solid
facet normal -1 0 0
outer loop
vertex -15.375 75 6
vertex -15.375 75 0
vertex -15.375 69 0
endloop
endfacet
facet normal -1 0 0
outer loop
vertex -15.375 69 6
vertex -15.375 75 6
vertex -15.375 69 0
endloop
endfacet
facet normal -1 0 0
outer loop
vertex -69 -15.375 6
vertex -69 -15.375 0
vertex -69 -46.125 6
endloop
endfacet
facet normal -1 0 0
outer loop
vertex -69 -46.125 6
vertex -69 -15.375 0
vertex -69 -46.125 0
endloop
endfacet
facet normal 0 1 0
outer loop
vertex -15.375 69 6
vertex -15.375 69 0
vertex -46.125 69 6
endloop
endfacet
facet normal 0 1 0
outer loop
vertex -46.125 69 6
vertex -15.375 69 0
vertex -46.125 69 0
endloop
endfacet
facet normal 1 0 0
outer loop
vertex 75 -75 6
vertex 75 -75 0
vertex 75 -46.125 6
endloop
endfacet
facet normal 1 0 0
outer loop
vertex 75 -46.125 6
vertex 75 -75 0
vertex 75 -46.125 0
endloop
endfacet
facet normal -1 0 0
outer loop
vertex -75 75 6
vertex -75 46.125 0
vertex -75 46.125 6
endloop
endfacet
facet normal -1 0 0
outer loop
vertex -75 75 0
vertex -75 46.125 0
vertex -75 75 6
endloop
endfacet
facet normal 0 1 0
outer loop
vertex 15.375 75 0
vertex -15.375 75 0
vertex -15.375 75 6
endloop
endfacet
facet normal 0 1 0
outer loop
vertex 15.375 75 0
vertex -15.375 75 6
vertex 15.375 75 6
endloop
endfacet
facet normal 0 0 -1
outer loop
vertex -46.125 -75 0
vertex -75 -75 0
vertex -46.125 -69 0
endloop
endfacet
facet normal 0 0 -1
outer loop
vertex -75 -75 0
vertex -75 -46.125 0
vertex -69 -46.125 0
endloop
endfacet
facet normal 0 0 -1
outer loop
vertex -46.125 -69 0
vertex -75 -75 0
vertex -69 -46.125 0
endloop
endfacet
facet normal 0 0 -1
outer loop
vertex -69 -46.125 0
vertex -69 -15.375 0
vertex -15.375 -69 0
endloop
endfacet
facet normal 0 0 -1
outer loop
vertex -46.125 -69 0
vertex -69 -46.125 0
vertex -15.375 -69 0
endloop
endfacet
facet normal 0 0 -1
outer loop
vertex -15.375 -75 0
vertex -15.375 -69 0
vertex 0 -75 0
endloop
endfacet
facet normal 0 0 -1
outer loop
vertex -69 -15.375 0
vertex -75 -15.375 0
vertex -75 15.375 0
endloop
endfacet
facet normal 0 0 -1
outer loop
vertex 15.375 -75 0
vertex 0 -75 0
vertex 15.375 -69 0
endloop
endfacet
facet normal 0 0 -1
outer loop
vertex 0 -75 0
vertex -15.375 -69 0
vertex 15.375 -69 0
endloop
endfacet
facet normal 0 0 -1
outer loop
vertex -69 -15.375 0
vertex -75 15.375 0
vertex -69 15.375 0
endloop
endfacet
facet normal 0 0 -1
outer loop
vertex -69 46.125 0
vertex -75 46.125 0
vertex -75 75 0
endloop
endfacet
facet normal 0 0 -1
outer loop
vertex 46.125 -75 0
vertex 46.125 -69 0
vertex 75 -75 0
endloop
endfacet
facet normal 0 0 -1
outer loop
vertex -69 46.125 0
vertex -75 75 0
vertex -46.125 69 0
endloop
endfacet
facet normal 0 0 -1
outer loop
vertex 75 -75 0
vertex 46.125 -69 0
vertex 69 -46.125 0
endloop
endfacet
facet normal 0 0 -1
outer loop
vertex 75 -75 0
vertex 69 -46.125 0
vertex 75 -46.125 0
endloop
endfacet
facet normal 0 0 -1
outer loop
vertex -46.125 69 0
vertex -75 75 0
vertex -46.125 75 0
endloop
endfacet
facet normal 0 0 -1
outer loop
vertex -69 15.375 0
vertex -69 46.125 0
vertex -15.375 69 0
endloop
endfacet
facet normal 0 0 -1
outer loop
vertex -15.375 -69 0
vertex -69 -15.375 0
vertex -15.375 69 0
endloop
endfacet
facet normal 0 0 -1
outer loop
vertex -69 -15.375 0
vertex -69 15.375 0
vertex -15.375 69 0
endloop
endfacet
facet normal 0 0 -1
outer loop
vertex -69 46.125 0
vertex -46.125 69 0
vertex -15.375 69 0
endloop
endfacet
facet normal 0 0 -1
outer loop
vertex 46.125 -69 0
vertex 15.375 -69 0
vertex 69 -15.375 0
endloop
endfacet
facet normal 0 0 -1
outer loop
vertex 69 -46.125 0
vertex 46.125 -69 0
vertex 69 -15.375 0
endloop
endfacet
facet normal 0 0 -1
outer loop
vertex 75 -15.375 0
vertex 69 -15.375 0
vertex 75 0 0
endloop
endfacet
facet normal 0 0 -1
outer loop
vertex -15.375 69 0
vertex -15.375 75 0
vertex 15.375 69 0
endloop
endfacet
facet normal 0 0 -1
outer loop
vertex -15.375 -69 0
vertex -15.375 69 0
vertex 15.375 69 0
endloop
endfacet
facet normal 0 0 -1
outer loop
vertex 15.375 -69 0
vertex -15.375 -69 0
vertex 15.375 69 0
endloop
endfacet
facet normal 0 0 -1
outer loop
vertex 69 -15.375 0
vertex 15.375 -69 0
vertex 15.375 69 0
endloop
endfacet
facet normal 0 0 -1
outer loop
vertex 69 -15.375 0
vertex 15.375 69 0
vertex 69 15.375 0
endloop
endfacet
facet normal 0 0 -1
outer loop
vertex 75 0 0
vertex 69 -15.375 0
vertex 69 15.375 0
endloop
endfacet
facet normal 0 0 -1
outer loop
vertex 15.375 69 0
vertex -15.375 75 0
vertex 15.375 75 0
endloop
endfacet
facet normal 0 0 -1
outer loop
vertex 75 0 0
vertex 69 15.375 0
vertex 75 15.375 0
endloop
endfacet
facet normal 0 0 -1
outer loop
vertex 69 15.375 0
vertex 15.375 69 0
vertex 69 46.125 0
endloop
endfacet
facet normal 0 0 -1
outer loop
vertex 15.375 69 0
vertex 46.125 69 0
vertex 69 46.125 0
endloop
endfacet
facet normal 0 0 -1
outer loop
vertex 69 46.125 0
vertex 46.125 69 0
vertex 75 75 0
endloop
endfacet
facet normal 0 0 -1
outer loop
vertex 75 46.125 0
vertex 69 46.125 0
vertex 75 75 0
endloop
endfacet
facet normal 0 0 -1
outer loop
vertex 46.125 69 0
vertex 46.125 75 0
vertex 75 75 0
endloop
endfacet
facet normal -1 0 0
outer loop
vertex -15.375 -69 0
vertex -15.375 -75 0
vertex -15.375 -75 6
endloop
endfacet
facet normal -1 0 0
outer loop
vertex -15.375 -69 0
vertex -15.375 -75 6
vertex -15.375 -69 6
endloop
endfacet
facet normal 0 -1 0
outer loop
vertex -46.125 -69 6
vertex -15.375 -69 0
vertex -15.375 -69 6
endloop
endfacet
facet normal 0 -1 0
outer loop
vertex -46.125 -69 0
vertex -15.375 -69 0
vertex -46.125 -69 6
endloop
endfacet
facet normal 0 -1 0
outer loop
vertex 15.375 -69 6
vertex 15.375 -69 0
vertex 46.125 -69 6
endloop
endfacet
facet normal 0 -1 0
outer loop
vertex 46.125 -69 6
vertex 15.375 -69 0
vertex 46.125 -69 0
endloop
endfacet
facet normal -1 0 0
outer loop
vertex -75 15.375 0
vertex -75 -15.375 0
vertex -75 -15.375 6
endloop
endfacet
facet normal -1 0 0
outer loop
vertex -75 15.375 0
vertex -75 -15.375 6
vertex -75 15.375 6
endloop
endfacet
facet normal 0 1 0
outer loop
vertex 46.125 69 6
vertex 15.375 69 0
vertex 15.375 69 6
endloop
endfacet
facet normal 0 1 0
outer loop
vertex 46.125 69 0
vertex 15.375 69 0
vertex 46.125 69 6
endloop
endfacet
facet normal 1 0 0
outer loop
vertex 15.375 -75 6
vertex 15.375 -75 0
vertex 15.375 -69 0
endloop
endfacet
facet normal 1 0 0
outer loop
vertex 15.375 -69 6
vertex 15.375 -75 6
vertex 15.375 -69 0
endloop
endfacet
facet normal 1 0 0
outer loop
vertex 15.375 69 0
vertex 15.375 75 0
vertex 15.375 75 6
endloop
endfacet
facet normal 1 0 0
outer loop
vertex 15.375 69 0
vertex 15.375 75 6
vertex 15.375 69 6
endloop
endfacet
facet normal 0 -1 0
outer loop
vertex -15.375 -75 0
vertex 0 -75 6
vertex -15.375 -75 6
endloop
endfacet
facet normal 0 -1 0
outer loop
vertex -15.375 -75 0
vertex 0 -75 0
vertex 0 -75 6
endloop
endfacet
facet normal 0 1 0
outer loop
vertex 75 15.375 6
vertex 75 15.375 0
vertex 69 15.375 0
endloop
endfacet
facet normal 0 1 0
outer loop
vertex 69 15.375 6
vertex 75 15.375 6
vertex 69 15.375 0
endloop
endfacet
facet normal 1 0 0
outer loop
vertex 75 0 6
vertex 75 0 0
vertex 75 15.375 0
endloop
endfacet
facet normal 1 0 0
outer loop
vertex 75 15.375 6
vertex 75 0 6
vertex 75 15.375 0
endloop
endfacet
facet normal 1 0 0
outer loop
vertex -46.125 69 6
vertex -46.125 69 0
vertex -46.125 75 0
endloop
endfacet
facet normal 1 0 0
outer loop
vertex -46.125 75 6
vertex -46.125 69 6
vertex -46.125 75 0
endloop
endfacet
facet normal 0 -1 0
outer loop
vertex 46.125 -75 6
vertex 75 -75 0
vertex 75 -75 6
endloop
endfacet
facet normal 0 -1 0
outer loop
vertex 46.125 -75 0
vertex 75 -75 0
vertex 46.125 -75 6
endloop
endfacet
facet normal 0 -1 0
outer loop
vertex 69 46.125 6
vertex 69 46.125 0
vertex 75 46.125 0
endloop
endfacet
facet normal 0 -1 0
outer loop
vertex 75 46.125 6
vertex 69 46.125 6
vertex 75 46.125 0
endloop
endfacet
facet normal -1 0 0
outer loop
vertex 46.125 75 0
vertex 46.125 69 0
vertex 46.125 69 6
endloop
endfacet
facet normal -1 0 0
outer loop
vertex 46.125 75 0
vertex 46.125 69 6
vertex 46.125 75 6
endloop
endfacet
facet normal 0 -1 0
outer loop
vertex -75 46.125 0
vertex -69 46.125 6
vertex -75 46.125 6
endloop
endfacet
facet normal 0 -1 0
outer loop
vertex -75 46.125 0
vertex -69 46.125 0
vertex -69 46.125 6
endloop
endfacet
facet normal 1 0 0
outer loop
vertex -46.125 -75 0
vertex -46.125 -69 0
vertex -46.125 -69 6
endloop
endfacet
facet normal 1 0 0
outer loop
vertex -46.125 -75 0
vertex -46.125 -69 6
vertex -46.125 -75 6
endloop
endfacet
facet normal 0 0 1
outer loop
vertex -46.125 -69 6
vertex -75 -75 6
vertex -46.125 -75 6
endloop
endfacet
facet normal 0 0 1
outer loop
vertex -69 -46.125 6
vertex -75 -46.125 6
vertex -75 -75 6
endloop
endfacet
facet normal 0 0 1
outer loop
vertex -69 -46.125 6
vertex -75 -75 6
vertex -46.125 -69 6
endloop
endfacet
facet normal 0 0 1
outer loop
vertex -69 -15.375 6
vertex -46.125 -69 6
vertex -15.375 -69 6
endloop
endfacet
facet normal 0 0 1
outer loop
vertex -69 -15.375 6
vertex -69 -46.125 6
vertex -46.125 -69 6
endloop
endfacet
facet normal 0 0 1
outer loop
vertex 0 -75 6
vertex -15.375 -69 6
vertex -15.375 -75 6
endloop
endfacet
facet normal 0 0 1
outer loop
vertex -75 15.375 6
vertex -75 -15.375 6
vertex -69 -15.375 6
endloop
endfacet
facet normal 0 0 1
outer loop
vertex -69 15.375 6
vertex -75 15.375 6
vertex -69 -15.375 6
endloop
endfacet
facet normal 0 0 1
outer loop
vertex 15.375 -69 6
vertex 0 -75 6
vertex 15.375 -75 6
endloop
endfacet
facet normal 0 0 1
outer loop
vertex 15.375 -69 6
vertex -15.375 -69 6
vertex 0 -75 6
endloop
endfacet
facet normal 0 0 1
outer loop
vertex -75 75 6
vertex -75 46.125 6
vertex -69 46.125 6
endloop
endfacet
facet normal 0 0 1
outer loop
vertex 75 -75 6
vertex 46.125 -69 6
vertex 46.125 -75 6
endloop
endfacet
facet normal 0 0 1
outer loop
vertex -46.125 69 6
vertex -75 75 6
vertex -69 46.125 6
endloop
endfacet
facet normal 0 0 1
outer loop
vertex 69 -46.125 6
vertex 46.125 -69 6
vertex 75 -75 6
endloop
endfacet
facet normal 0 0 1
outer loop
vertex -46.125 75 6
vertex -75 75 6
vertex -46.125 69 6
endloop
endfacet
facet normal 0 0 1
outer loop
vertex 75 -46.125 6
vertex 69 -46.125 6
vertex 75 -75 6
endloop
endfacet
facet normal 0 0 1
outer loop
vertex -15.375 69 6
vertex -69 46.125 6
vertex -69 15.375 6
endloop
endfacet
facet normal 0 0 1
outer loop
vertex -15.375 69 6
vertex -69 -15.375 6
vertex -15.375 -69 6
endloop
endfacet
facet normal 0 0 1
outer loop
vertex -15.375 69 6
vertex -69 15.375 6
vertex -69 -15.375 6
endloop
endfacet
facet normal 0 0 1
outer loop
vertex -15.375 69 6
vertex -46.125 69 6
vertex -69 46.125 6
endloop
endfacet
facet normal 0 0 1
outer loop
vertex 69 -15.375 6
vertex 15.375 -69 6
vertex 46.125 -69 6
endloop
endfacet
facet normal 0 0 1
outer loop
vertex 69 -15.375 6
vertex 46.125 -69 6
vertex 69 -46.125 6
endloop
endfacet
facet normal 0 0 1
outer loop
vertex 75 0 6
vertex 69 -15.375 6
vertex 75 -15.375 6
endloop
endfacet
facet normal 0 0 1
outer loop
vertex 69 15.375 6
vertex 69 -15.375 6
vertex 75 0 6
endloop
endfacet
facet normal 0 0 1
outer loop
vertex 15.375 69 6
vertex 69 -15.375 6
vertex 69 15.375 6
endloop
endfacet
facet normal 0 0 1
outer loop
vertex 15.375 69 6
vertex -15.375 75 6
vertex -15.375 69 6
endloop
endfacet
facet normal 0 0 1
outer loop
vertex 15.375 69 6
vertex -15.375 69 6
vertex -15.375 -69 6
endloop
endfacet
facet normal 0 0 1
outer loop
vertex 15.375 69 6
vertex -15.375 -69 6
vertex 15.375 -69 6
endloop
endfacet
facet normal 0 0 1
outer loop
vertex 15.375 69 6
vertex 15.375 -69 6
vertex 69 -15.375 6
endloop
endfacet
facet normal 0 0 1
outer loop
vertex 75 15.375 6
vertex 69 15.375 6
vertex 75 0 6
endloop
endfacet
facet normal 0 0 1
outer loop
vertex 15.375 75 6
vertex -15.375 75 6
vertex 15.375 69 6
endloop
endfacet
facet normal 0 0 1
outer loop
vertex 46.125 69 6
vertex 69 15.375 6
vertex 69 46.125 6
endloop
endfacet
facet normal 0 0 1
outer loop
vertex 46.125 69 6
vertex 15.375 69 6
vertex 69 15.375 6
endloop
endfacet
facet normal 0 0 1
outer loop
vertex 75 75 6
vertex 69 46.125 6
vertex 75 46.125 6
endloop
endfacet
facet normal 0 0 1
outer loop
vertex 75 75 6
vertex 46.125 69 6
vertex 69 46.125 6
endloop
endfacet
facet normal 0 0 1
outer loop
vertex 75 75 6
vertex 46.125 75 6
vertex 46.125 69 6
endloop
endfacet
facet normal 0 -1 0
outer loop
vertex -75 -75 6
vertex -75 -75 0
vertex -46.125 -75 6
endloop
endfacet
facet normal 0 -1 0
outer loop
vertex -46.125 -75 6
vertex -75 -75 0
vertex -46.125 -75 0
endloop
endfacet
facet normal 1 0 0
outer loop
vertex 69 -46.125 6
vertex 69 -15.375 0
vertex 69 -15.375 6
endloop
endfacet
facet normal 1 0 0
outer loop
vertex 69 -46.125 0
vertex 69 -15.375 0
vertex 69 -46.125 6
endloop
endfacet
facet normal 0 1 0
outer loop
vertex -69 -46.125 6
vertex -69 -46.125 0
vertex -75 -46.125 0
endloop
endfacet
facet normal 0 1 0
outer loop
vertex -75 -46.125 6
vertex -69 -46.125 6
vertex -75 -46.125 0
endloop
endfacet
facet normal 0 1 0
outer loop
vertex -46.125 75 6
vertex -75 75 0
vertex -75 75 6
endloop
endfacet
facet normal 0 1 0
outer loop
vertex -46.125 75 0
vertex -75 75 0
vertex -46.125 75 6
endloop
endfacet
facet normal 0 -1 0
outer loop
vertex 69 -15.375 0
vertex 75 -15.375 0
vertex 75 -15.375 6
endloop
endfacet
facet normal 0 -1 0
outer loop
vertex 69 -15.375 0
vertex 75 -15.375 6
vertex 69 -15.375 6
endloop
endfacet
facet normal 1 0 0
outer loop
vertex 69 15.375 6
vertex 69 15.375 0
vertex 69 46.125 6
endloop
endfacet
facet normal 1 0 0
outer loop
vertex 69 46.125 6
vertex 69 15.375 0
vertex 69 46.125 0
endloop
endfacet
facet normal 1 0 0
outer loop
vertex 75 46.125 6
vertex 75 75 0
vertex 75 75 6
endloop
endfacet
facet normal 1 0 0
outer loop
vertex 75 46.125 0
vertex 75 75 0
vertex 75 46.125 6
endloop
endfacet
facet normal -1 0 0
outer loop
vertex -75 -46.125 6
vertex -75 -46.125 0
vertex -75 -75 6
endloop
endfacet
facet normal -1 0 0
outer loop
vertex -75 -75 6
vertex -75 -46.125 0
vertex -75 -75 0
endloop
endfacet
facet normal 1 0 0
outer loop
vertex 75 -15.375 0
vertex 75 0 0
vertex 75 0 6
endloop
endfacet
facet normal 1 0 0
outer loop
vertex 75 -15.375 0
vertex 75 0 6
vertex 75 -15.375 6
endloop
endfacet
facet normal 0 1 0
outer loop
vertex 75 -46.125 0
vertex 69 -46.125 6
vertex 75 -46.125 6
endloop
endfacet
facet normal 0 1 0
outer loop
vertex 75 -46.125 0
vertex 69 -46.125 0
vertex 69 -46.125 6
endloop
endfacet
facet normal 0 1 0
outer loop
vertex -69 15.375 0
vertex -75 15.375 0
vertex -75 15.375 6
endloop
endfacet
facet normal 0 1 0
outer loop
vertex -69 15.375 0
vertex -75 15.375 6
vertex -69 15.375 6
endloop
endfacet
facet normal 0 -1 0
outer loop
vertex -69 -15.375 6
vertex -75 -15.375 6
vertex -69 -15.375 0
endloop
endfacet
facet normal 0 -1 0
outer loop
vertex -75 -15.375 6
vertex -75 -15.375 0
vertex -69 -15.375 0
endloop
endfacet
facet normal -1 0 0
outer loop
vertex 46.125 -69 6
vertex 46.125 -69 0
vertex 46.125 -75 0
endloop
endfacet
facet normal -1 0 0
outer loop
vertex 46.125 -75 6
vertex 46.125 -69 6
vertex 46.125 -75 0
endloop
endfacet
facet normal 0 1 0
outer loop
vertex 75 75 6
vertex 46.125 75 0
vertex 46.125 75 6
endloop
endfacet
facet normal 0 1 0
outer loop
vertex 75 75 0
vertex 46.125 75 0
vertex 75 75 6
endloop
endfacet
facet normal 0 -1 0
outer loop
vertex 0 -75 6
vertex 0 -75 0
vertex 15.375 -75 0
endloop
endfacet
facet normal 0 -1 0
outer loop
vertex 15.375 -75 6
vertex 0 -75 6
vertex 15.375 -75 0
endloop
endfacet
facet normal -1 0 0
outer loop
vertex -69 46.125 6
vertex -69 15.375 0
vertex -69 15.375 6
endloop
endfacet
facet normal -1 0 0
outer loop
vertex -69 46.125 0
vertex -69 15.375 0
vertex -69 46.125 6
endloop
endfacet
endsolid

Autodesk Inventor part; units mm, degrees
ref_plane "YZ Plane" through (0, 0, 0) normal (1, 0, 0) x (0, 1, 0)
ref_plane "XZ Plane" through (0, 0, 0) normal (0, 1, 0) x (-1, 0, 0)
ref_plane "XY Plane" through (0, 0, 0) normal (0, 0, 1) x (1, 0, 0)
sketch "Sketch1" plane through (0, 0, 0) normal (0, 0, 1) x (1, 0, 0)
  line L0 (-75, 75) -> (75, -75) construction
  line L1 (75, 75) -> (-75, -75) construction
  line L2 (0, -75) -> (15.375, -75)
  line L3 (15.375, -75) -> (15.375, -69)
  line L4 (15.375, -69) -> (46.125, -69)
  line L5 (46.125, -69) -> (46.125, -75)
  line L6 (75, -75) -> (46.125, -75)
  line L7 (75, -75) -> (75, -44.25)
  line L8 (75, 0) -> (75, -15.375)
  line L9 (75, -15.375) -> (69, -15.375)
  line L10 (69, -15.375) -> (69, -46.125)
  line L11 (69, -46.125) -> (75, -46.125)
  line L12 (75, 0) -> (75, 15.375)
  line L13 (75, 15.375) -> (69, 15.375)
  line L14 (69, 15.375) -> (69, 46.125)
  line L15 (69, 46.125) -> (75, 46.125)
  line L16 (-15.375, -75) -> (-15.375, -69)
  line L17 (-15.375, -69) -> (-46.125, -69)
  line L18 (-46.125, -69) -> (-46.125, -75)
  line L19 (-75, -75) -> (-46.125, -75)
  line L20 (-75, 15.375) -> (-69, 15.375)
  line L21 (-69, 15.375) -> (-69, 46.125)
  line L22 (-69, 46.125) -> (-75, 46.125)
  line L23 (-15.375, 75) -> (-15.375, 69)
  line L24 (-15.375, 69) -> (-46.125, 69)
  line L25 (-46.125, 69) -> (-46.125, 75)
  line L26 (15.375, 75) -> (15.375, 69)
  line L27 (15.375, 69) -> (46.125, 69)
  line L28 (46.125, 69) -> (46.125, 75)
  line L29 (-69, -46.125) -> (-75, -46.125)
  line L30 (-69, -15.375) -> (-69, -46.125)
  line L31 (-75, -15.375) -> (-69, -15.375)
  line L32 (15.375, -75) -> (-15.375, -75)
  line L33 (-46.125, -75) -> (-75, -75)
  line L34 (75, 75) -> (75, 46.125)
  line L35 (75, 15.375) -> (75, -15.375)
  line L36 (75, -46.125) -> (75, -75)
  line L37 (-75, 75) -> (-46.125, 75)
  line L38 (-75, 46.125) -> (-75, 75)
  line L39 (-75, -15.375) -> (-75, 15.375)
  line L40 (-75, -46.125) -> (-75, -75)
  line L41 (-15.375, 75) -> (15.375, 75)
  line L42 (46.125, 75) -> (75, 75)
  point P0 (0, 0)
  dimension "d0" = 150
  dimension "d1" = 150
  dimension "d2" = 15.375
  dimension "d3" = 6
  dimension "d4" = 30.75
  dimension "d8" = 15.375
  dimension "d9" = 6
  dimension "d10" = 30.75
extrude "Extrusion1" add sketch "Sketch1" along normal blind 6
properties part number "Backandfront_2"
